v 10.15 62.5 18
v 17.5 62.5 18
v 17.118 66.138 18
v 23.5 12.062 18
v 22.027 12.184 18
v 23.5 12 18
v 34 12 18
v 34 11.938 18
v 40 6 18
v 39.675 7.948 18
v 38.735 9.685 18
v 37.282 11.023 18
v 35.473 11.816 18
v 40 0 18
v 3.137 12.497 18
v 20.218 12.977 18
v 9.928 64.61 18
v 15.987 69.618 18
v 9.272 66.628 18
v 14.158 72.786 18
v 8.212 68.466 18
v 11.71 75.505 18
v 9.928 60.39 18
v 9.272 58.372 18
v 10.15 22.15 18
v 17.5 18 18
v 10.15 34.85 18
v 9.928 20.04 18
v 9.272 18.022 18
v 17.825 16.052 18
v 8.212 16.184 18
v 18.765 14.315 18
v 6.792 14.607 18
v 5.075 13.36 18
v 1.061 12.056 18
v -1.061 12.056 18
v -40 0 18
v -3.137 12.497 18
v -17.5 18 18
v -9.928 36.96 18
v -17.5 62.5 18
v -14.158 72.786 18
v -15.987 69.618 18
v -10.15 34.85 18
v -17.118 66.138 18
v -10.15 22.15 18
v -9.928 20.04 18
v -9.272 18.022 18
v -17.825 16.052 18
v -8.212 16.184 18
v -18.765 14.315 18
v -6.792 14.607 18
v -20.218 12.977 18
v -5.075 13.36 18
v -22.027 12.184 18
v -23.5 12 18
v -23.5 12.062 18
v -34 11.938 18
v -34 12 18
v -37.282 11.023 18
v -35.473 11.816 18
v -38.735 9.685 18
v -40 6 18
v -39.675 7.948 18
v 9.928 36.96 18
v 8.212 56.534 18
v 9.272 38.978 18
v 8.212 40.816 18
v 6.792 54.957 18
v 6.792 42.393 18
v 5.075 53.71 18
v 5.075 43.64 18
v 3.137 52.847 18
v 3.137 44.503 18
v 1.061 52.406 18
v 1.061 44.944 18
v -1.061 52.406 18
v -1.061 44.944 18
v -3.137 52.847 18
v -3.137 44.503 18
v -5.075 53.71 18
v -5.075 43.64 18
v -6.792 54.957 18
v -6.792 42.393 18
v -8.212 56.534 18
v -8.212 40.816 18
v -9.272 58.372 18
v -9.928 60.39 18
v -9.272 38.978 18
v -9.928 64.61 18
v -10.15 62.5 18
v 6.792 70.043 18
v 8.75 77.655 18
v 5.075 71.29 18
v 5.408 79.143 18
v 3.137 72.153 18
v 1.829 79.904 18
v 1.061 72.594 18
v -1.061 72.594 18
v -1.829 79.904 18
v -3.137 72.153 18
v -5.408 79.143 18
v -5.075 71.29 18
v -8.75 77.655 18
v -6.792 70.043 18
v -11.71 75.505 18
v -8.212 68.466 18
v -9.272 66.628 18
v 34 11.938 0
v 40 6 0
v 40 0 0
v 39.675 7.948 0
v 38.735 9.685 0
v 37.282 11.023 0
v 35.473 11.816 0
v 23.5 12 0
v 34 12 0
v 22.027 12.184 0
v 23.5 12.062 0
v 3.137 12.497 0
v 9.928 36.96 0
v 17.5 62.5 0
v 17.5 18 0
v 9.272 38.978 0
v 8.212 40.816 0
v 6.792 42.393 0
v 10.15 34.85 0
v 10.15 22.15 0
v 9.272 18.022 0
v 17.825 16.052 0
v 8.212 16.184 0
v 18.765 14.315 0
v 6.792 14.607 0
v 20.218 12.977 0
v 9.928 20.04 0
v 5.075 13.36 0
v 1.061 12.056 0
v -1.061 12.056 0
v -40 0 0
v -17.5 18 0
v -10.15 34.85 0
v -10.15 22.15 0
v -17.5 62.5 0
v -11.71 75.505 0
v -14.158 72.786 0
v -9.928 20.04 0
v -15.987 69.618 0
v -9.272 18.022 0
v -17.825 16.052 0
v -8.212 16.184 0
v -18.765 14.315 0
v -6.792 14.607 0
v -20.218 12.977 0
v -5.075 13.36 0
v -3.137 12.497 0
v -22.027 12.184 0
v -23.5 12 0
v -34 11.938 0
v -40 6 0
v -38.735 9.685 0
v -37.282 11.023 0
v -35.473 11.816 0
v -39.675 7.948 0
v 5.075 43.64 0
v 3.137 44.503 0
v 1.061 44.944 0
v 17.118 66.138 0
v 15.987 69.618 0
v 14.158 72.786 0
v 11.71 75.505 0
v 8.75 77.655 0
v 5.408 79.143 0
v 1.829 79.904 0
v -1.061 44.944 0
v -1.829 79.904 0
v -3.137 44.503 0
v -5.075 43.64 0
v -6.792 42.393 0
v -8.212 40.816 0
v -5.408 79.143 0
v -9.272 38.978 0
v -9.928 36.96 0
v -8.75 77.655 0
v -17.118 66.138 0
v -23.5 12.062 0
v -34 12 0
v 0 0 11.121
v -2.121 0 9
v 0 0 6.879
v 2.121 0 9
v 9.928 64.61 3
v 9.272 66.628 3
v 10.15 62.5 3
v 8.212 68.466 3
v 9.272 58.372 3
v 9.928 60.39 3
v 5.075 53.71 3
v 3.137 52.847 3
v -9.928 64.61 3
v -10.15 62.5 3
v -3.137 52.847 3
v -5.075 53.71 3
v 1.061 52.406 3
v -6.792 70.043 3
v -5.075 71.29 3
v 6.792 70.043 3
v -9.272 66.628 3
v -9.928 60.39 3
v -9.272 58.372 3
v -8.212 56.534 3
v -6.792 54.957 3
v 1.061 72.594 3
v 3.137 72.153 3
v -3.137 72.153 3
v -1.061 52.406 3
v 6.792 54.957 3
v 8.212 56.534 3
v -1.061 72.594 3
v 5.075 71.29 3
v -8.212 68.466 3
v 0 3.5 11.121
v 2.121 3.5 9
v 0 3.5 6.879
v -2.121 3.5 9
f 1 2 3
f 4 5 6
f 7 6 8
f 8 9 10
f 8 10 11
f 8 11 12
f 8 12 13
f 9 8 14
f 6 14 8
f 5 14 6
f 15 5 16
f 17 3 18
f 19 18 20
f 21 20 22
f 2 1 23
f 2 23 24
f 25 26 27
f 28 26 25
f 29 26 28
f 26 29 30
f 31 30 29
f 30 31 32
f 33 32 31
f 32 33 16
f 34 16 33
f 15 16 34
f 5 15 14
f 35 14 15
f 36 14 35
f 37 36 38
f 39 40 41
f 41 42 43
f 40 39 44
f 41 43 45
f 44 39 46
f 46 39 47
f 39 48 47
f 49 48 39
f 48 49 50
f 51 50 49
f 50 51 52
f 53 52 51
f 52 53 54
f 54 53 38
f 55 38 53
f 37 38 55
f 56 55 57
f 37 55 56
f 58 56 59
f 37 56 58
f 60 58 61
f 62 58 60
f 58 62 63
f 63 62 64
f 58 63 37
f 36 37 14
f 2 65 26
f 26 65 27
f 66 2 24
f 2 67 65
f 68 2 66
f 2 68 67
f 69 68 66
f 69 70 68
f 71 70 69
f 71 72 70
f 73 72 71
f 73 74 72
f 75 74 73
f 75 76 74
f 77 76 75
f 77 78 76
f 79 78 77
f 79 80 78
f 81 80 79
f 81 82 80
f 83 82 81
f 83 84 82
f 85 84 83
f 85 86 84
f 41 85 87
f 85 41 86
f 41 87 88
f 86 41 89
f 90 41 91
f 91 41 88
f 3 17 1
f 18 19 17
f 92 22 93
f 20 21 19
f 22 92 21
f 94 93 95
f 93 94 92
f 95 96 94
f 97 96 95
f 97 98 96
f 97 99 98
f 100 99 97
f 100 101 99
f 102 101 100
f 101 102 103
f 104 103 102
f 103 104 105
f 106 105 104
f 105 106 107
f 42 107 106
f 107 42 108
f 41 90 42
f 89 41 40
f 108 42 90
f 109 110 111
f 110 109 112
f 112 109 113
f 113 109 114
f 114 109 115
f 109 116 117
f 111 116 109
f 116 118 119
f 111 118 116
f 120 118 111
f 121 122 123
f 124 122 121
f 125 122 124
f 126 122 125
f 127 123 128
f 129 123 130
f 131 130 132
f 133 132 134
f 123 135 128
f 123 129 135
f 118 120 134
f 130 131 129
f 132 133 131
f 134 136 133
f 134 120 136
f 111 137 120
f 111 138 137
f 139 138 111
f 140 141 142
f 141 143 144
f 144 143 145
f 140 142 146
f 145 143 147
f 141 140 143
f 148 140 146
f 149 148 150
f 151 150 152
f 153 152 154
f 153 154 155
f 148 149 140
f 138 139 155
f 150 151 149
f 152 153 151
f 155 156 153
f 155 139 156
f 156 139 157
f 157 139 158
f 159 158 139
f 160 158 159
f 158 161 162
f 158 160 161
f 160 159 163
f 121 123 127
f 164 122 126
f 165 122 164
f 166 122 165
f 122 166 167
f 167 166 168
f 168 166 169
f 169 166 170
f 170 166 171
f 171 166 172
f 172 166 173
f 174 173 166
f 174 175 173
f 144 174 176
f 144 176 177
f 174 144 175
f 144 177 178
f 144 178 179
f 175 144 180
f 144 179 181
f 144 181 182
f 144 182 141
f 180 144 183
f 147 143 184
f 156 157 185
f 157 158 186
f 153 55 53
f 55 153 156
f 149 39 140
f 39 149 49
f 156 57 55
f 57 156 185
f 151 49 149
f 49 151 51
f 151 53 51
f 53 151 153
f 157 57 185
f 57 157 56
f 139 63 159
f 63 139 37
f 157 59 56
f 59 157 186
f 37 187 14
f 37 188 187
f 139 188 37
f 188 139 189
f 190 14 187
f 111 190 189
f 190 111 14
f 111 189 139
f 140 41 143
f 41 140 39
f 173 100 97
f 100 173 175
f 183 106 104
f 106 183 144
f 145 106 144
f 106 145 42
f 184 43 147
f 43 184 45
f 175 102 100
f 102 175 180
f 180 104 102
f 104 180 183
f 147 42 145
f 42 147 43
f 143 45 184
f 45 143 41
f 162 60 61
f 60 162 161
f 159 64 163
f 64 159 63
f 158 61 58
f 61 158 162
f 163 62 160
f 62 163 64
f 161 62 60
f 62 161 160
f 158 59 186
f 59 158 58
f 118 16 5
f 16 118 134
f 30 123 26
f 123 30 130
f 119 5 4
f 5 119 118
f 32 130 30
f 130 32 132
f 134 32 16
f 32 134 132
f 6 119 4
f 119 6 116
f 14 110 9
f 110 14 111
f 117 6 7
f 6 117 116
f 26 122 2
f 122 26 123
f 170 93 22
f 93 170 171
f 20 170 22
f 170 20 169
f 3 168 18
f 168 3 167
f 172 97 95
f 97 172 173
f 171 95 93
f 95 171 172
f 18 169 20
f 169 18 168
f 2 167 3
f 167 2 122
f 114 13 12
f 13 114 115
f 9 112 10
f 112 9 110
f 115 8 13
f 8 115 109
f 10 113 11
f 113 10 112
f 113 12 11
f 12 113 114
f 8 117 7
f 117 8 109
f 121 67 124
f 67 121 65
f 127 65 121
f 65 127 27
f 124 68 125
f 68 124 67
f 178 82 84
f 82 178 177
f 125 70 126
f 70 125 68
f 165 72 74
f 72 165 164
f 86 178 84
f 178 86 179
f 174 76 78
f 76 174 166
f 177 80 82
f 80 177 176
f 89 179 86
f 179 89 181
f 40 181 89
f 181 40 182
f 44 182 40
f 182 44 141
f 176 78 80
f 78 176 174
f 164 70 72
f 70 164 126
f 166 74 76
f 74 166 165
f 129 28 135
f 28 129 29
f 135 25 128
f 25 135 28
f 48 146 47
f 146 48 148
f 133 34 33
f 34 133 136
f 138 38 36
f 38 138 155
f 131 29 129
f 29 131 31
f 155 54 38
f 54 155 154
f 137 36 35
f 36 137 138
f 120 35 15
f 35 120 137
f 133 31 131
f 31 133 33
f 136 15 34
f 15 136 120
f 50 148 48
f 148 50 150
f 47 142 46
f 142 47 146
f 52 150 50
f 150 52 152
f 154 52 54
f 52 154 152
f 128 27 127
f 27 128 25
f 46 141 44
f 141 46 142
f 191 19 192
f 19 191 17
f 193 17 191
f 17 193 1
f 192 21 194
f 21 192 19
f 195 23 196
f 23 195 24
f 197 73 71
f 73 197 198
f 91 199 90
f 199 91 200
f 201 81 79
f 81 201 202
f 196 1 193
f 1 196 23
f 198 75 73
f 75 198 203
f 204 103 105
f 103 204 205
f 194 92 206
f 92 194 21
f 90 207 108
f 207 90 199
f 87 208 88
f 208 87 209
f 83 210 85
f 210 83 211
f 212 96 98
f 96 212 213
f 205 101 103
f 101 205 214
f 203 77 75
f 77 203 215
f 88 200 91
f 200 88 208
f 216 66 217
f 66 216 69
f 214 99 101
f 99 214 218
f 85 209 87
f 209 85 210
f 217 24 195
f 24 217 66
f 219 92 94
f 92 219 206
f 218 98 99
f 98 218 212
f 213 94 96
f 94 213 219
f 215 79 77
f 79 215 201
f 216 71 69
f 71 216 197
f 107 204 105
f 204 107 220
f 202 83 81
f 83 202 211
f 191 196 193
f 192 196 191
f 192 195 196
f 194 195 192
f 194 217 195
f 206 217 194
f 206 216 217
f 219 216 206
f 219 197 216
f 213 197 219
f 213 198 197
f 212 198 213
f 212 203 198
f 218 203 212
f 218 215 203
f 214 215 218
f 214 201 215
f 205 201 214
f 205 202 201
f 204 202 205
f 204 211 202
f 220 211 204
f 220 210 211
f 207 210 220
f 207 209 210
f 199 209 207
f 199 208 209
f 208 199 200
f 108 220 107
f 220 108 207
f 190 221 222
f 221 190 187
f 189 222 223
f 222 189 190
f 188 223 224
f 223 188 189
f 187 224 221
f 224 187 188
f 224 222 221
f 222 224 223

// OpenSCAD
01_Thick = 18;
02_Height = 80;
03_Full_Width = 80;
04_Central_Width = 35;
05_Bore_Diam = 20.3;
06_Bore_Depth = 15;
07_Base_Height = 12;

Bore_Radius = 05_Bore_Diam/2;
C_Radius = 04_Central_Width /2;
B_Radius = 07_Base_Height;
Fillet_Radius = 6;

04_Angle_A = 0;
05_Angle_B = 38.4093912;
06_Slot = 21;
07_Axis_Depth=25;
BigNum = 99;
SmallNum = 1;

module fillet(f_radius, f_height){
	translate([-f_radius*2,0,0])
		difference(){
			translate([0,-SmallNum,0])
				cube([f_radius*2+SmallNum, f_radius*2+SmallNum, f_height]);
			translate([f_radius, f_radius, -SmallNum])
				cylinder(r1 = f_radius, r2 = f_radius, h = BigNum);
			translate([-SmallNum, -SmallNum, -SmallNum])
				cube([f_radius+SmallNum, BigNum, BigNum]);
			translate([f_radius-SmallNum, f_radius, -SmallNum])
				cube([BigNum, f_radius+SmallNum, BigNum]);
			
		}
};




module Handle() {

	01_Thick = 18;
	02_Height = 80;
	03_Full_Width = 80;
	04_Central_Width = 35;
	05_Bore_Diam = 20.3;
	06_Bore_Depth = 15;
	07_Base_Height = 12;
	
	Bore_Radius = 05_Bore_Diam/2;
	C_Radius = 04_Central_Width /2;
	B_Radius = 07_Base_Height;
	Fillet_Radius = 6;
	
	04_Angle_A = 0;
	05_Angle_B = 38.4093912;
	06_Slot = 21;
	07_Axis_Depth=25;
	BigNum = 99;
	SmallNum = 1;

	// Half handle 
	module Half_Handle(){
		translate ([-03_Full_Width/2,0,0])
			difference(){
				union(){
					cube([03_Full_Width/2, 07_Base_Height, 01_Thick]);
					translate([03_Full_Width/2-04_Central_Width/2,0,0])
						cube([04_Central_Width/2, 02_Height-C_Radius, 01_Thick]);
					translate([03_Full_Width/2, 02_Height-C_Radius, 0])
						cylinder(r1 = C_Radius, r2 = C_Radius, h= 01_Thick);
					//fillet(
					
					translate([03_Full_Width/2-04_Central_Width/2,07_Base_Height,0])
						fillet(f_radius = Fillet_Radius, f_height = 01_Thick);
				
		
				}
				translate([0,07_Base_Height,-SmallNum])
					rotate([0,0,180])
						fillet(f_radius = Fillet_Radius, f_height = 01_Thick+SmallNum*2);
			}
		
	}
	
	
	// Main Shape
	difference(){
		union(){
			Half_Handle();
			mirror([1,0,0])
				Half_Handle();
		}
		translate([0,02_Height-C_Radius,01_Thick-06_Bore_Depth])
			cylinder(r1=05_Bore_Diam/2, r2=05_Bore_Diam/2, h=BigNum);
		union(){
		translate([0,02_Height-04_Central_Width-Bore_Radius,-SmallNum])
			cylinder(r1=Bore_Radius, r2=Bore_Radius, h=BigNum);
		translate([0,07_Base_Height+Bore_Radius,-SmallNum])
			cylinder(r1=Bore_Radius, r2=Bore_Radius, h=BigNum);
		translate([-Bore_Radius, 07_Base_Height+Bore_Radius,-SmallNum])
			cube([05_Bore_Diam, 02_Height-04_Central_Width-Bore_Radius-(07_Base_Height+Bore_Radius), BigNum]);
	
		}
		//Removal key
		translate([0,0,01_Thick/2]) rotate([0,45,0])translate([-1.5,-1.5,-1.5])  cube([3,5,3]);
	}
		
}

Handle(
	01_Thick, 
	02_Height, 
	03_Full_Width,
	04_Central_Width,
	05_Bore_Diam,
	06_Bore_Depth,
	07_Base_Height,
	04_Angle_A,
	05_Angle_B,
	06_Slot,
	07_Axis_Depth);

//Put this in to give little pivot for the removal key
//translate([-5,-6,0])
	//cube([10,5,01_Thick/2-1]);
